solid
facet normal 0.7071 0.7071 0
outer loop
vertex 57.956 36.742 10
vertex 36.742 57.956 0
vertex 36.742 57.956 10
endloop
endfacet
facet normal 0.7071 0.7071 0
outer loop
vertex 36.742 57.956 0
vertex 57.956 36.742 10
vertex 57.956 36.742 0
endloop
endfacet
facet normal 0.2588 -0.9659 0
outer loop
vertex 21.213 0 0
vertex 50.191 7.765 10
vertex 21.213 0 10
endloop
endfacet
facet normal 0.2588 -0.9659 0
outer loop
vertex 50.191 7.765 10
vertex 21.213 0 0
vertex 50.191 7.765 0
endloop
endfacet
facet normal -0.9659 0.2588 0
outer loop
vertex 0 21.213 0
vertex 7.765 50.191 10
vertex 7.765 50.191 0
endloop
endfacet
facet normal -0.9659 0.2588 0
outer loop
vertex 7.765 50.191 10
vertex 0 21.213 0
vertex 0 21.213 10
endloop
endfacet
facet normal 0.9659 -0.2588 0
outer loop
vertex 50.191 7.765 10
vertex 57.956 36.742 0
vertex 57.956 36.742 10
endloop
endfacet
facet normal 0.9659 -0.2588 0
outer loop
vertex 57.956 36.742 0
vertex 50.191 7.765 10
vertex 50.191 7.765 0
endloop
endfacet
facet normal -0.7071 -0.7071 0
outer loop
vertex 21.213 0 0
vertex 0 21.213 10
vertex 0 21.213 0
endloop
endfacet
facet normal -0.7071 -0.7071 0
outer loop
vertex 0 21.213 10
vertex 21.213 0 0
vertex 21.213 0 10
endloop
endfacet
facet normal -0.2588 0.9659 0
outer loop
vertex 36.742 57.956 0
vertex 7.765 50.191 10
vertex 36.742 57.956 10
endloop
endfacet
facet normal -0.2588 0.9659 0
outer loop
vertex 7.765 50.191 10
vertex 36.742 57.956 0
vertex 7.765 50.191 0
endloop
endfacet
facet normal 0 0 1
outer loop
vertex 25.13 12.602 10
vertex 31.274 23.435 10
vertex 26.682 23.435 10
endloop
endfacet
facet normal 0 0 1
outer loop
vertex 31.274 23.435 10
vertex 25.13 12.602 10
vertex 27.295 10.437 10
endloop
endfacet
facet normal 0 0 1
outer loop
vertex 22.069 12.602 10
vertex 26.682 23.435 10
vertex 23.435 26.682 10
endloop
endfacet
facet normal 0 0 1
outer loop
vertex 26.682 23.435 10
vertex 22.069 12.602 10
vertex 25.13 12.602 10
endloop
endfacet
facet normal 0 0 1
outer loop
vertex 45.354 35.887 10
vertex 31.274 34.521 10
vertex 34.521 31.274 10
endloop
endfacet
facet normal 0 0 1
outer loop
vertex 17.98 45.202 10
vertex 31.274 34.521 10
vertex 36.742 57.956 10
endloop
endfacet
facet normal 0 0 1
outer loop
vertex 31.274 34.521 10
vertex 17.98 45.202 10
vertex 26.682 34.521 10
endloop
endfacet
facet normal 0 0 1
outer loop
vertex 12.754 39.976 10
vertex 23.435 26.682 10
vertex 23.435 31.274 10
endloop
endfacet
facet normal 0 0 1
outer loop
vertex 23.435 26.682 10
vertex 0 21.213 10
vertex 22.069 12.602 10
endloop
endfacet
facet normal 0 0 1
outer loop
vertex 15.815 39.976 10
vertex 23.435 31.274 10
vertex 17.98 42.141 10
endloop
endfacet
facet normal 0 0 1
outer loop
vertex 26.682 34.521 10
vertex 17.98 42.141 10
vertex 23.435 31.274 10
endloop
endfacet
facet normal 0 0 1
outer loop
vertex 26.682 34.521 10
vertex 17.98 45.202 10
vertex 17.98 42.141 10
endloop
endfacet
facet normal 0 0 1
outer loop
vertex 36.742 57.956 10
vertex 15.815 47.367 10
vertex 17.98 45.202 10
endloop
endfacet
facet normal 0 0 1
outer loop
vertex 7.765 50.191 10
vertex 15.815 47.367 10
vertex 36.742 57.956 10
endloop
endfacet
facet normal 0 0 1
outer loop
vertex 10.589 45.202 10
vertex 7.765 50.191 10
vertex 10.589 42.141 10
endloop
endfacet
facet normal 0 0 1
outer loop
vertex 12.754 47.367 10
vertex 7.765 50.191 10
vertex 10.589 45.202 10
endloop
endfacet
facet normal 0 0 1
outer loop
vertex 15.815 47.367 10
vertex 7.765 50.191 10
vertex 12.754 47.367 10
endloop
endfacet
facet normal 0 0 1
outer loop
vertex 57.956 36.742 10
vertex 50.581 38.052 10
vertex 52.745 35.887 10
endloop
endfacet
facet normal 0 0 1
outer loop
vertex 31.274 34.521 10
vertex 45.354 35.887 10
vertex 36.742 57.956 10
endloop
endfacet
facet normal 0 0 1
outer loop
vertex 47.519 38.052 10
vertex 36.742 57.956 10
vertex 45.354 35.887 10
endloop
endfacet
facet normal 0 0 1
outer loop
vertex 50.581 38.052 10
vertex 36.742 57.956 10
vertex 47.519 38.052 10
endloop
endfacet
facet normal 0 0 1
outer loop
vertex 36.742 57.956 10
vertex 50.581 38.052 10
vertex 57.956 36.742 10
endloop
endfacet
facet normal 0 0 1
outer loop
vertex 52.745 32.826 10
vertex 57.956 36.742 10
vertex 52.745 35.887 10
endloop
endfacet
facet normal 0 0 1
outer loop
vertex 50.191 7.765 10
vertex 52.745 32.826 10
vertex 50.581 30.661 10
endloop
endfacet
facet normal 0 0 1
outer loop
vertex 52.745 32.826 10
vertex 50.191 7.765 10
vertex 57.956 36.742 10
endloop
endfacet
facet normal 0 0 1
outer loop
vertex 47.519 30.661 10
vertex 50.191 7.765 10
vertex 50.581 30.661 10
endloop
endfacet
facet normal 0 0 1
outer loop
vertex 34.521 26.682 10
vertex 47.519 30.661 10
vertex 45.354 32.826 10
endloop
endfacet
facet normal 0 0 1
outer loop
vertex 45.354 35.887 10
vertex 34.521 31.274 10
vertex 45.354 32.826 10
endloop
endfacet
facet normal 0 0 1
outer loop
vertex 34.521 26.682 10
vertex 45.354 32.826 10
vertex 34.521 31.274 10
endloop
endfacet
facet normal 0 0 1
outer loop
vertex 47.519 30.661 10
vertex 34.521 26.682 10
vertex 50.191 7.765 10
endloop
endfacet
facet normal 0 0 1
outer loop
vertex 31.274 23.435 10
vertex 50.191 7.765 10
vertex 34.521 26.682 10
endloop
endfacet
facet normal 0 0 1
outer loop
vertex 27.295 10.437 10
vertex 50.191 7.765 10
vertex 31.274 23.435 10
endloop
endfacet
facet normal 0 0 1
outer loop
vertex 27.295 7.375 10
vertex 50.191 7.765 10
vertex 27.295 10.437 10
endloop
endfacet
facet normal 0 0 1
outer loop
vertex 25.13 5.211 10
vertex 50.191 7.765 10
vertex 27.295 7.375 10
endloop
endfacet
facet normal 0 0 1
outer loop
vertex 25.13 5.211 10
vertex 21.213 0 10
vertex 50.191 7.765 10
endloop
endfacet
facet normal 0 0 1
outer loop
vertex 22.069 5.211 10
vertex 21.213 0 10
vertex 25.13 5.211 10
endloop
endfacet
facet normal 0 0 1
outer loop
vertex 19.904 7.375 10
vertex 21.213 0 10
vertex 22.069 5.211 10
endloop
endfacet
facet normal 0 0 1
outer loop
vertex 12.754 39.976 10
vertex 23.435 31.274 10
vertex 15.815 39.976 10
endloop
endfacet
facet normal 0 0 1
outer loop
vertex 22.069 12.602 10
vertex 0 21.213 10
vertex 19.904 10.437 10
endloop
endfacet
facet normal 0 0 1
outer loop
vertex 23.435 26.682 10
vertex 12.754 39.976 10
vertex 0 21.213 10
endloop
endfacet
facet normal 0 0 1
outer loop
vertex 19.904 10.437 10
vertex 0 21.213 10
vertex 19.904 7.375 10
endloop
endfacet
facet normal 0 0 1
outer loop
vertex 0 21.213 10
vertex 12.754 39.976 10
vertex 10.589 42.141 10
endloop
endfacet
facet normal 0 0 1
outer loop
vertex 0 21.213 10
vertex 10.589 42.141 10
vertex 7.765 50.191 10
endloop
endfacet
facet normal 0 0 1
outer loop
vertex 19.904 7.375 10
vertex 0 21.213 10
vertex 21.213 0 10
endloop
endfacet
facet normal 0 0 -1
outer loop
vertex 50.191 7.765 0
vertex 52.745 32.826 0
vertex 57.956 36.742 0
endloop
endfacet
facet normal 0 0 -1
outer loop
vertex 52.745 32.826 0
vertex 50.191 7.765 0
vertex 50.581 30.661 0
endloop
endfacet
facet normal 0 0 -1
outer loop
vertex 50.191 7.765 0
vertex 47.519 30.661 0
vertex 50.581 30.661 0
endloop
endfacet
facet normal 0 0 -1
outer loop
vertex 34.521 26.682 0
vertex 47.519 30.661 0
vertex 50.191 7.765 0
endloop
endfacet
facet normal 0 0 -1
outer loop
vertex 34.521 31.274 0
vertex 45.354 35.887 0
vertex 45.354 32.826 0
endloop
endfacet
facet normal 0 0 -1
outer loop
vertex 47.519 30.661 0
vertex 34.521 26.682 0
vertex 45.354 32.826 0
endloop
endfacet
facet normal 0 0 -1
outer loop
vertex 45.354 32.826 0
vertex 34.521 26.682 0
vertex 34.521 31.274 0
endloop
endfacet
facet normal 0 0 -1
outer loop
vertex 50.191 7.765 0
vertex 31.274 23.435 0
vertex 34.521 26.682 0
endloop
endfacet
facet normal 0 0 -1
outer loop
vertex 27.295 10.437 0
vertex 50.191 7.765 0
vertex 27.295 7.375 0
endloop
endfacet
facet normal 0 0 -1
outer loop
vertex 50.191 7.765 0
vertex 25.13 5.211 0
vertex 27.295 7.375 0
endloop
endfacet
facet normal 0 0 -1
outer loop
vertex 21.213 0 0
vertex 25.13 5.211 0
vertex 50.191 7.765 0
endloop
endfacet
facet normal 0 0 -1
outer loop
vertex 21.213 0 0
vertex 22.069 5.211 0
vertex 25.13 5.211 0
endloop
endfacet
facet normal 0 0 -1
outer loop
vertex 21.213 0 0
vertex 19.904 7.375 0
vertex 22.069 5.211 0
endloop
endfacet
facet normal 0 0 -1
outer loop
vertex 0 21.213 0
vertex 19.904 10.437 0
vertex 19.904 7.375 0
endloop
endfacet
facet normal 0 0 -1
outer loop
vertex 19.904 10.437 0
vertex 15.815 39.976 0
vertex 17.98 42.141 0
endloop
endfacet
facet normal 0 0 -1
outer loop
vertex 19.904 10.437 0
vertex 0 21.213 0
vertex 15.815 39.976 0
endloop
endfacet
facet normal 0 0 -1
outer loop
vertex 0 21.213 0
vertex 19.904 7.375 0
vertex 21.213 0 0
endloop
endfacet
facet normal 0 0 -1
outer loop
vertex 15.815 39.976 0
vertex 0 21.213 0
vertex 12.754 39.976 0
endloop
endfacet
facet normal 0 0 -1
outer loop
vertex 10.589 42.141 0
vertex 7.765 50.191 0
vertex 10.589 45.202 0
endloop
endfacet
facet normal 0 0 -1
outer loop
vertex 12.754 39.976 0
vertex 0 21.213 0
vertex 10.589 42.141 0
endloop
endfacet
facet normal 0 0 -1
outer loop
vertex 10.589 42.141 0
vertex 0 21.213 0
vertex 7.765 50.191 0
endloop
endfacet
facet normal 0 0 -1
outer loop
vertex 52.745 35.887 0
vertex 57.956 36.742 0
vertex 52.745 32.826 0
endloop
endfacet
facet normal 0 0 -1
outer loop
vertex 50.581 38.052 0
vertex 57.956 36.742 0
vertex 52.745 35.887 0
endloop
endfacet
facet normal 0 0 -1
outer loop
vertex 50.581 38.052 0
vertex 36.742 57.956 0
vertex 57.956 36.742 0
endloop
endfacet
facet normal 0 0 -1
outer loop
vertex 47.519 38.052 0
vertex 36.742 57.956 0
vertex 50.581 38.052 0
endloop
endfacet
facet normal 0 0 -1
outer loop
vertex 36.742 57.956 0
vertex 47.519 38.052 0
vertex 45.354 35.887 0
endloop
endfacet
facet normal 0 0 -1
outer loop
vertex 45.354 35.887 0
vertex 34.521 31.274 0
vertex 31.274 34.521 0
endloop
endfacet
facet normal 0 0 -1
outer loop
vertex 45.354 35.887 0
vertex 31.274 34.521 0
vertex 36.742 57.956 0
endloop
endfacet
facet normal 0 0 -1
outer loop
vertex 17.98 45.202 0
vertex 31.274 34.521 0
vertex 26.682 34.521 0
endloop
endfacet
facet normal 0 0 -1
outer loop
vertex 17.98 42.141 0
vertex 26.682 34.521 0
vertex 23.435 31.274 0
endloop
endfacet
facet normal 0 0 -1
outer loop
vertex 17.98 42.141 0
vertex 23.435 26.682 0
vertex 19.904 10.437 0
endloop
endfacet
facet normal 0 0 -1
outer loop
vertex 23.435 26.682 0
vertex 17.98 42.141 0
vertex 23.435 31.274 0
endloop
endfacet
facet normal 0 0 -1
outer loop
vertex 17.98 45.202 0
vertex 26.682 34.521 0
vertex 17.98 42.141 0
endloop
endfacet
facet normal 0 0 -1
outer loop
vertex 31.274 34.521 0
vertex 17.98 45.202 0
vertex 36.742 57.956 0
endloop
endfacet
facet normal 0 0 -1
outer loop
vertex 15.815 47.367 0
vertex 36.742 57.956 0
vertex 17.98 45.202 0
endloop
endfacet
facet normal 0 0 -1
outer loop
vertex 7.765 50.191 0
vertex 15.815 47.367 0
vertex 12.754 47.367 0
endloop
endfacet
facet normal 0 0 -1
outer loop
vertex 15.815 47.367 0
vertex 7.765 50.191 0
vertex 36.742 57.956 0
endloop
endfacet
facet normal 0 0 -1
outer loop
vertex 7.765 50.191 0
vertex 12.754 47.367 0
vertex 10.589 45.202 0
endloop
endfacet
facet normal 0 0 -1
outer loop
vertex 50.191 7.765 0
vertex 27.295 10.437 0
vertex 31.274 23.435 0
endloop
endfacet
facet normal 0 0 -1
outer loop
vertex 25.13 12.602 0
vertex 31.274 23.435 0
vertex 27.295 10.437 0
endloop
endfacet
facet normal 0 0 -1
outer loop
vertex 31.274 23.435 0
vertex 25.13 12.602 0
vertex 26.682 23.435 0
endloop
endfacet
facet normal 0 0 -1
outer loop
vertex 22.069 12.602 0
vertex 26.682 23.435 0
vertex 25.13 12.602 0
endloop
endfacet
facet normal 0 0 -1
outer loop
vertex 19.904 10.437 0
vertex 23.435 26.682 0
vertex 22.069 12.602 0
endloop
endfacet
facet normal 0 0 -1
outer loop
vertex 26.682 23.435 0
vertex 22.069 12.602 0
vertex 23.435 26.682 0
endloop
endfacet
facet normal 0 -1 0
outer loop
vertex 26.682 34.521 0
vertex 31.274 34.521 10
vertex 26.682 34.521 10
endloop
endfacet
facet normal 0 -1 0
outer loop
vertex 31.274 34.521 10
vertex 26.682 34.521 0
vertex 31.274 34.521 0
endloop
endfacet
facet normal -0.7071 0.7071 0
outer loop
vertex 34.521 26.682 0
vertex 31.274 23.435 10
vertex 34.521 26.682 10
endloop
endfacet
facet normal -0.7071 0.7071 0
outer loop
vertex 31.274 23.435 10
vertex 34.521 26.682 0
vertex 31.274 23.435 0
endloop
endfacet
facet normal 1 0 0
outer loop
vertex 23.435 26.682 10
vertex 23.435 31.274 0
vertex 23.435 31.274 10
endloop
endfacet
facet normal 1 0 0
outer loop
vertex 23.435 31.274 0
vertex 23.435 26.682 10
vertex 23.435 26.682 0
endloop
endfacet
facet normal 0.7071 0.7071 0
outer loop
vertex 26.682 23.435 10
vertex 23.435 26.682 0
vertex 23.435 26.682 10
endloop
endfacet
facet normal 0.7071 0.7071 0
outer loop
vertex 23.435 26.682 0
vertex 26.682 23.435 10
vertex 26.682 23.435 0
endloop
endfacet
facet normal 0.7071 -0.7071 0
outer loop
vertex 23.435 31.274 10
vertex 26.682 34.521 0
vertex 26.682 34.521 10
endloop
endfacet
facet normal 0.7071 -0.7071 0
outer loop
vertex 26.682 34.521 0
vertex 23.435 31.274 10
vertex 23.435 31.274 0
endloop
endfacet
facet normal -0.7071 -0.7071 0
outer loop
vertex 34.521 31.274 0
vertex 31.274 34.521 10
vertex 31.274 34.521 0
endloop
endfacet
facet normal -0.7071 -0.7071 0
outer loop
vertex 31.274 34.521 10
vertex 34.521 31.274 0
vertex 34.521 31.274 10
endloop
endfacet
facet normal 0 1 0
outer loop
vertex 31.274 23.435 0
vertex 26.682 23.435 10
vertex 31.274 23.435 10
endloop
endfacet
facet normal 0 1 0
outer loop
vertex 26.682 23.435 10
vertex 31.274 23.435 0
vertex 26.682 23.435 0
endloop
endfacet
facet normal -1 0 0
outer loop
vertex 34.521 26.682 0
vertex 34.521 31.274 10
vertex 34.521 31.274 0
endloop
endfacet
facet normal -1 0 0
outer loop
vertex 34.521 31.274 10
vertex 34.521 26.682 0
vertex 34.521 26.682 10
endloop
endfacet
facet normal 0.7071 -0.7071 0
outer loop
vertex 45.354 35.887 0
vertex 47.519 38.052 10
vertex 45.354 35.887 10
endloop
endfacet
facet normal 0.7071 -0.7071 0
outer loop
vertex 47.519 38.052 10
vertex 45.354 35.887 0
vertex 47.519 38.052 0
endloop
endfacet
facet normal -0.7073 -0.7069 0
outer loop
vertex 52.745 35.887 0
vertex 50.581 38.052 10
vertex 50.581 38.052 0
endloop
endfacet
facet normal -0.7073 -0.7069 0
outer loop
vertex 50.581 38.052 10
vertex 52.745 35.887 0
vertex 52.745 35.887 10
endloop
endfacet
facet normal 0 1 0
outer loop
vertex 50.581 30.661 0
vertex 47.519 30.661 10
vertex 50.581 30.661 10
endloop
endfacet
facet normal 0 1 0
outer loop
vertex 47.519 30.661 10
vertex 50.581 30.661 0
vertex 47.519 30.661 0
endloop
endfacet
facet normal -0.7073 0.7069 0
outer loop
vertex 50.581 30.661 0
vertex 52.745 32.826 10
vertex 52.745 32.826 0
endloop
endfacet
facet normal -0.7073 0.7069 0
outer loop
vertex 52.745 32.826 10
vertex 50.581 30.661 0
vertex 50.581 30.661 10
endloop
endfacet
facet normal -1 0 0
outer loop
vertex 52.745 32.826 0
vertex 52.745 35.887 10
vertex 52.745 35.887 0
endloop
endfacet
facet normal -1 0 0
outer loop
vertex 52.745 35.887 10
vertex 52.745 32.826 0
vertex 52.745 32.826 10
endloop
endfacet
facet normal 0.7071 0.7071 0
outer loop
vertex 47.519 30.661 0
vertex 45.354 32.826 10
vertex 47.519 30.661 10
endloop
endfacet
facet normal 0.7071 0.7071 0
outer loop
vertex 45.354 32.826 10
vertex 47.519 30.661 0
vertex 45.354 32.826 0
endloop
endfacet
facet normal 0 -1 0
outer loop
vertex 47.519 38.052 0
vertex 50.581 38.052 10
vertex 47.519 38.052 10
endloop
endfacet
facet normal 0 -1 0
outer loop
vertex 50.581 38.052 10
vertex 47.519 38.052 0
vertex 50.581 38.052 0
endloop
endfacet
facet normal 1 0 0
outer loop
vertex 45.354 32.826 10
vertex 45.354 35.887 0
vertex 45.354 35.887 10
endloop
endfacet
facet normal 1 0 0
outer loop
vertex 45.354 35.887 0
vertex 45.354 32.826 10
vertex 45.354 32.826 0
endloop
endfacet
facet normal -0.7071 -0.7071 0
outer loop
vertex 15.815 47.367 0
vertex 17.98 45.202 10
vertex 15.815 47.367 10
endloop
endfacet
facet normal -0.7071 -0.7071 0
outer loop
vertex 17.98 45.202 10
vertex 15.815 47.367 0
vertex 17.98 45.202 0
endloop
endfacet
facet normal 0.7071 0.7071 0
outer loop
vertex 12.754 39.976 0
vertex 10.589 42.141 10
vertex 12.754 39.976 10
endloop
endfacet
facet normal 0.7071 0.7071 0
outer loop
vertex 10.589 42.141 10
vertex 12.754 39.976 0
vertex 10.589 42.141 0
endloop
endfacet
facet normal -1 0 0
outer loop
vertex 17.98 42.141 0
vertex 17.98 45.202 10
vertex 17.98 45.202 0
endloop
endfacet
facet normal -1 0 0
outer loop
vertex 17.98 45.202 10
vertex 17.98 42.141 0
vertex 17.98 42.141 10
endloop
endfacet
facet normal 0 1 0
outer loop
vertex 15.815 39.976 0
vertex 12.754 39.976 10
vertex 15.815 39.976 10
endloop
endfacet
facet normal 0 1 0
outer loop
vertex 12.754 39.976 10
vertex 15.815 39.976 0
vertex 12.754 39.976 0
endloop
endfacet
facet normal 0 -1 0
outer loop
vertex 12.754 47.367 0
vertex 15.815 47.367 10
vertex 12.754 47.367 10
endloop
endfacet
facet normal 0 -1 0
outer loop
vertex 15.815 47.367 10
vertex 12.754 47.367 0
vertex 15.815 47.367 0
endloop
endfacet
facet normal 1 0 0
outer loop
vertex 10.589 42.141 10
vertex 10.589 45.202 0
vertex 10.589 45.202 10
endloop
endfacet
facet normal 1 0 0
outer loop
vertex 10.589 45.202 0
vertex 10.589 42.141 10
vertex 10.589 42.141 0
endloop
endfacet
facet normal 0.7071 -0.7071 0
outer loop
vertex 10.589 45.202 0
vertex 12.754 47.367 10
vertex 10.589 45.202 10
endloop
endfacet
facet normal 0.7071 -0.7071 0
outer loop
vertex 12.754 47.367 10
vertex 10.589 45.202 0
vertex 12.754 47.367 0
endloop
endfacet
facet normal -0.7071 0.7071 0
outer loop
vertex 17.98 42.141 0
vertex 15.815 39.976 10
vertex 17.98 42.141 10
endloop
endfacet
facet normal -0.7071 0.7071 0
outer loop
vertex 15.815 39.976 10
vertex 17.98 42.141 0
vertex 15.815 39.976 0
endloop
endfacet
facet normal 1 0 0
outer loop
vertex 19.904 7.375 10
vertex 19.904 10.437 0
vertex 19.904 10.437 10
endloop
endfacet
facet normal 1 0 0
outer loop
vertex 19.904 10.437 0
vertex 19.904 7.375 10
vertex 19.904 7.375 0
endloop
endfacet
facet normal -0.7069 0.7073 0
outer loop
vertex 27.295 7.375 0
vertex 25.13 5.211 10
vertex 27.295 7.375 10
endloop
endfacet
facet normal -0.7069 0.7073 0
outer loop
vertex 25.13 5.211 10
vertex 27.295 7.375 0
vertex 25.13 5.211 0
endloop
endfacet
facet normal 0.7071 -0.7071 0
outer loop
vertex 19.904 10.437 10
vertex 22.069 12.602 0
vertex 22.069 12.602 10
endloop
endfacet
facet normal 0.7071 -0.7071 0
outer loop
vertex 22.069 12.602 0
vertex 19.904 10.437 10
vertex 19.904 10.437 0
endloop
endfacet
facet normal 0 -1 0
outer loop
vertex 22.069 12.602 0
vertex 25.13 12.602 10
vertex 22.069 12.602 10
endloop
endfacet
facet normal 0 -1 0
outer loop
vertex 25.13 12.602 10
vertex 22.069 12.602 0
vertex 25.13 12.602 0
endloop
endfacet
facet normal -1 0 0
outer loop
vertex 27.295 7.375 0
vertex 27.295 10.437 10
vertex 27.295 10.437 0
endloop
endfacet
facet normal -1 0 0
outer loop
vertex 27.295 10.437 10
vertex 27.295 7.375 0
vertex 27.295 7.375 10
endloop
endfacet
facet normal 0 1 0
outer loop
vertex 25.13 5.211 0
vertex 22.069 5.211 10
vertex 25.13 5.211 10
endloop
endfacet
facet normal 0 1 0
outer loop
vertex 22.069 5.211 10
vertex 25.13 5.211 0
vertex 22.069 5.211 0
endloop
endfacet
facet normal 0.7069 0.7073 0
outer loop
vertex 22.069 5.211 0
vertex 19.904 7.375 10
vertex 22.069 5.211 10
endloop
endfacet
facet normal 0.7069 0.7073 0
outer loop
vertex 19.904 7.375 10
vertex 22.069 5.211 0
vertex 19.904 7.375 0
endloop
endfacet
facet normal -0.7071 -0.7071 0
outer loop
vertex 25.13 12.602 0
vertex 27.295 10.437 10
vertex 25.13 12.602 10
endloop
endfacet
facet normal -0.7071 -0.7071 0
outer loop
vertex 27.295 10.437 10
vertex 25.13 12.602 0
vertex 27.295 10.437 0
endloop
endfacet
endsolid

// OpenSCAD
$fn = 32;

// ----------------------------------------------------------------------
// Polygon plate: 6-gon R30, 3 bolt windows
// ----------------------------------------------------------------------

// --- parameters (mm) ---
sides = 6;                // number of polygon sides
plate_r = 30;             // circumscribed radius of the polygon
bore_r = 6;               // centre bore radius
bolts = 3;                // number of bolt windows
ring_r = 20.78;           // bolt-circle radius
bolt_r = 4;               // bolt window radius
plate_t = 10;             // plate thickness, Z (extrusion height)

plate_d = 2 * plate_r;  // circumscribed diameter
bore_d = 2 * bore_r;  // centre bore diameter
bolt_d = 2 * bolt_r;  // bolt window diameter
ring_d = 2 * ring_r;  // bolt-circle diameter

profile = [[57.956, 36.742], [36.742, 57.956], [7.765, 50.191], [0, 21.213], [21.213, 0], [50.191, 7.765]];  // primary outline, 6 points, counter clockwise
void_1 = [[34.521, 31.274], [31.274, 34.521], [26.682, 34.521], [23.435, 31.274], [23.435, 26.682], [26.682, 23.435], [31.274, 23.435], [34.521, 26.682]];  // centre bore, 8 points
void_2 = [[52.745, 35.887], [50.581, 38.052], [47.519, 38.052], [45.354, 35.887], [45.354, 32.826], [47.519, 30.661], [50.581, 30.661], [52.745, 32.826]];  // bolt window 1, 8 points
void_3 = [[17.98, 45.202], [15.815, 47.367], [12.754, 47.367], [10.589, 45.202], [10.589, 42.141], [12.754, 39.976], [15.815, 39.976], [17.98, 42.141]];  // bolt window 2, 8 points
void_4 = [[27.295, 10.437], [25.13, 12.602], [22.069, 12.602], [19.904, 10.437], [19.904, 7.375], [22.069, 5.211], [25.13, 5.211], [27.295, 7.375]];  // bolt window 3, 8 points

// --- the one profile operation ---
difference() {
  linear_extrude(height = plate_t) polygon(points = profile);
  translate([0, 0, -1])
    linear_extrude(height = plate_t + 2) polygon(points = void_1);
  translate([0, 0, -1])
    linear_extrude(height = plate_t + 2) polygon(points = void_2);
  translate([0, 0, -1])
    linear_extrude(height = plate_t + 2) polygon(points = void_3);
  translate([0, 0, -1])
    linear_extrude(height = plate_t + 2) polygon(points = void_4);
}
